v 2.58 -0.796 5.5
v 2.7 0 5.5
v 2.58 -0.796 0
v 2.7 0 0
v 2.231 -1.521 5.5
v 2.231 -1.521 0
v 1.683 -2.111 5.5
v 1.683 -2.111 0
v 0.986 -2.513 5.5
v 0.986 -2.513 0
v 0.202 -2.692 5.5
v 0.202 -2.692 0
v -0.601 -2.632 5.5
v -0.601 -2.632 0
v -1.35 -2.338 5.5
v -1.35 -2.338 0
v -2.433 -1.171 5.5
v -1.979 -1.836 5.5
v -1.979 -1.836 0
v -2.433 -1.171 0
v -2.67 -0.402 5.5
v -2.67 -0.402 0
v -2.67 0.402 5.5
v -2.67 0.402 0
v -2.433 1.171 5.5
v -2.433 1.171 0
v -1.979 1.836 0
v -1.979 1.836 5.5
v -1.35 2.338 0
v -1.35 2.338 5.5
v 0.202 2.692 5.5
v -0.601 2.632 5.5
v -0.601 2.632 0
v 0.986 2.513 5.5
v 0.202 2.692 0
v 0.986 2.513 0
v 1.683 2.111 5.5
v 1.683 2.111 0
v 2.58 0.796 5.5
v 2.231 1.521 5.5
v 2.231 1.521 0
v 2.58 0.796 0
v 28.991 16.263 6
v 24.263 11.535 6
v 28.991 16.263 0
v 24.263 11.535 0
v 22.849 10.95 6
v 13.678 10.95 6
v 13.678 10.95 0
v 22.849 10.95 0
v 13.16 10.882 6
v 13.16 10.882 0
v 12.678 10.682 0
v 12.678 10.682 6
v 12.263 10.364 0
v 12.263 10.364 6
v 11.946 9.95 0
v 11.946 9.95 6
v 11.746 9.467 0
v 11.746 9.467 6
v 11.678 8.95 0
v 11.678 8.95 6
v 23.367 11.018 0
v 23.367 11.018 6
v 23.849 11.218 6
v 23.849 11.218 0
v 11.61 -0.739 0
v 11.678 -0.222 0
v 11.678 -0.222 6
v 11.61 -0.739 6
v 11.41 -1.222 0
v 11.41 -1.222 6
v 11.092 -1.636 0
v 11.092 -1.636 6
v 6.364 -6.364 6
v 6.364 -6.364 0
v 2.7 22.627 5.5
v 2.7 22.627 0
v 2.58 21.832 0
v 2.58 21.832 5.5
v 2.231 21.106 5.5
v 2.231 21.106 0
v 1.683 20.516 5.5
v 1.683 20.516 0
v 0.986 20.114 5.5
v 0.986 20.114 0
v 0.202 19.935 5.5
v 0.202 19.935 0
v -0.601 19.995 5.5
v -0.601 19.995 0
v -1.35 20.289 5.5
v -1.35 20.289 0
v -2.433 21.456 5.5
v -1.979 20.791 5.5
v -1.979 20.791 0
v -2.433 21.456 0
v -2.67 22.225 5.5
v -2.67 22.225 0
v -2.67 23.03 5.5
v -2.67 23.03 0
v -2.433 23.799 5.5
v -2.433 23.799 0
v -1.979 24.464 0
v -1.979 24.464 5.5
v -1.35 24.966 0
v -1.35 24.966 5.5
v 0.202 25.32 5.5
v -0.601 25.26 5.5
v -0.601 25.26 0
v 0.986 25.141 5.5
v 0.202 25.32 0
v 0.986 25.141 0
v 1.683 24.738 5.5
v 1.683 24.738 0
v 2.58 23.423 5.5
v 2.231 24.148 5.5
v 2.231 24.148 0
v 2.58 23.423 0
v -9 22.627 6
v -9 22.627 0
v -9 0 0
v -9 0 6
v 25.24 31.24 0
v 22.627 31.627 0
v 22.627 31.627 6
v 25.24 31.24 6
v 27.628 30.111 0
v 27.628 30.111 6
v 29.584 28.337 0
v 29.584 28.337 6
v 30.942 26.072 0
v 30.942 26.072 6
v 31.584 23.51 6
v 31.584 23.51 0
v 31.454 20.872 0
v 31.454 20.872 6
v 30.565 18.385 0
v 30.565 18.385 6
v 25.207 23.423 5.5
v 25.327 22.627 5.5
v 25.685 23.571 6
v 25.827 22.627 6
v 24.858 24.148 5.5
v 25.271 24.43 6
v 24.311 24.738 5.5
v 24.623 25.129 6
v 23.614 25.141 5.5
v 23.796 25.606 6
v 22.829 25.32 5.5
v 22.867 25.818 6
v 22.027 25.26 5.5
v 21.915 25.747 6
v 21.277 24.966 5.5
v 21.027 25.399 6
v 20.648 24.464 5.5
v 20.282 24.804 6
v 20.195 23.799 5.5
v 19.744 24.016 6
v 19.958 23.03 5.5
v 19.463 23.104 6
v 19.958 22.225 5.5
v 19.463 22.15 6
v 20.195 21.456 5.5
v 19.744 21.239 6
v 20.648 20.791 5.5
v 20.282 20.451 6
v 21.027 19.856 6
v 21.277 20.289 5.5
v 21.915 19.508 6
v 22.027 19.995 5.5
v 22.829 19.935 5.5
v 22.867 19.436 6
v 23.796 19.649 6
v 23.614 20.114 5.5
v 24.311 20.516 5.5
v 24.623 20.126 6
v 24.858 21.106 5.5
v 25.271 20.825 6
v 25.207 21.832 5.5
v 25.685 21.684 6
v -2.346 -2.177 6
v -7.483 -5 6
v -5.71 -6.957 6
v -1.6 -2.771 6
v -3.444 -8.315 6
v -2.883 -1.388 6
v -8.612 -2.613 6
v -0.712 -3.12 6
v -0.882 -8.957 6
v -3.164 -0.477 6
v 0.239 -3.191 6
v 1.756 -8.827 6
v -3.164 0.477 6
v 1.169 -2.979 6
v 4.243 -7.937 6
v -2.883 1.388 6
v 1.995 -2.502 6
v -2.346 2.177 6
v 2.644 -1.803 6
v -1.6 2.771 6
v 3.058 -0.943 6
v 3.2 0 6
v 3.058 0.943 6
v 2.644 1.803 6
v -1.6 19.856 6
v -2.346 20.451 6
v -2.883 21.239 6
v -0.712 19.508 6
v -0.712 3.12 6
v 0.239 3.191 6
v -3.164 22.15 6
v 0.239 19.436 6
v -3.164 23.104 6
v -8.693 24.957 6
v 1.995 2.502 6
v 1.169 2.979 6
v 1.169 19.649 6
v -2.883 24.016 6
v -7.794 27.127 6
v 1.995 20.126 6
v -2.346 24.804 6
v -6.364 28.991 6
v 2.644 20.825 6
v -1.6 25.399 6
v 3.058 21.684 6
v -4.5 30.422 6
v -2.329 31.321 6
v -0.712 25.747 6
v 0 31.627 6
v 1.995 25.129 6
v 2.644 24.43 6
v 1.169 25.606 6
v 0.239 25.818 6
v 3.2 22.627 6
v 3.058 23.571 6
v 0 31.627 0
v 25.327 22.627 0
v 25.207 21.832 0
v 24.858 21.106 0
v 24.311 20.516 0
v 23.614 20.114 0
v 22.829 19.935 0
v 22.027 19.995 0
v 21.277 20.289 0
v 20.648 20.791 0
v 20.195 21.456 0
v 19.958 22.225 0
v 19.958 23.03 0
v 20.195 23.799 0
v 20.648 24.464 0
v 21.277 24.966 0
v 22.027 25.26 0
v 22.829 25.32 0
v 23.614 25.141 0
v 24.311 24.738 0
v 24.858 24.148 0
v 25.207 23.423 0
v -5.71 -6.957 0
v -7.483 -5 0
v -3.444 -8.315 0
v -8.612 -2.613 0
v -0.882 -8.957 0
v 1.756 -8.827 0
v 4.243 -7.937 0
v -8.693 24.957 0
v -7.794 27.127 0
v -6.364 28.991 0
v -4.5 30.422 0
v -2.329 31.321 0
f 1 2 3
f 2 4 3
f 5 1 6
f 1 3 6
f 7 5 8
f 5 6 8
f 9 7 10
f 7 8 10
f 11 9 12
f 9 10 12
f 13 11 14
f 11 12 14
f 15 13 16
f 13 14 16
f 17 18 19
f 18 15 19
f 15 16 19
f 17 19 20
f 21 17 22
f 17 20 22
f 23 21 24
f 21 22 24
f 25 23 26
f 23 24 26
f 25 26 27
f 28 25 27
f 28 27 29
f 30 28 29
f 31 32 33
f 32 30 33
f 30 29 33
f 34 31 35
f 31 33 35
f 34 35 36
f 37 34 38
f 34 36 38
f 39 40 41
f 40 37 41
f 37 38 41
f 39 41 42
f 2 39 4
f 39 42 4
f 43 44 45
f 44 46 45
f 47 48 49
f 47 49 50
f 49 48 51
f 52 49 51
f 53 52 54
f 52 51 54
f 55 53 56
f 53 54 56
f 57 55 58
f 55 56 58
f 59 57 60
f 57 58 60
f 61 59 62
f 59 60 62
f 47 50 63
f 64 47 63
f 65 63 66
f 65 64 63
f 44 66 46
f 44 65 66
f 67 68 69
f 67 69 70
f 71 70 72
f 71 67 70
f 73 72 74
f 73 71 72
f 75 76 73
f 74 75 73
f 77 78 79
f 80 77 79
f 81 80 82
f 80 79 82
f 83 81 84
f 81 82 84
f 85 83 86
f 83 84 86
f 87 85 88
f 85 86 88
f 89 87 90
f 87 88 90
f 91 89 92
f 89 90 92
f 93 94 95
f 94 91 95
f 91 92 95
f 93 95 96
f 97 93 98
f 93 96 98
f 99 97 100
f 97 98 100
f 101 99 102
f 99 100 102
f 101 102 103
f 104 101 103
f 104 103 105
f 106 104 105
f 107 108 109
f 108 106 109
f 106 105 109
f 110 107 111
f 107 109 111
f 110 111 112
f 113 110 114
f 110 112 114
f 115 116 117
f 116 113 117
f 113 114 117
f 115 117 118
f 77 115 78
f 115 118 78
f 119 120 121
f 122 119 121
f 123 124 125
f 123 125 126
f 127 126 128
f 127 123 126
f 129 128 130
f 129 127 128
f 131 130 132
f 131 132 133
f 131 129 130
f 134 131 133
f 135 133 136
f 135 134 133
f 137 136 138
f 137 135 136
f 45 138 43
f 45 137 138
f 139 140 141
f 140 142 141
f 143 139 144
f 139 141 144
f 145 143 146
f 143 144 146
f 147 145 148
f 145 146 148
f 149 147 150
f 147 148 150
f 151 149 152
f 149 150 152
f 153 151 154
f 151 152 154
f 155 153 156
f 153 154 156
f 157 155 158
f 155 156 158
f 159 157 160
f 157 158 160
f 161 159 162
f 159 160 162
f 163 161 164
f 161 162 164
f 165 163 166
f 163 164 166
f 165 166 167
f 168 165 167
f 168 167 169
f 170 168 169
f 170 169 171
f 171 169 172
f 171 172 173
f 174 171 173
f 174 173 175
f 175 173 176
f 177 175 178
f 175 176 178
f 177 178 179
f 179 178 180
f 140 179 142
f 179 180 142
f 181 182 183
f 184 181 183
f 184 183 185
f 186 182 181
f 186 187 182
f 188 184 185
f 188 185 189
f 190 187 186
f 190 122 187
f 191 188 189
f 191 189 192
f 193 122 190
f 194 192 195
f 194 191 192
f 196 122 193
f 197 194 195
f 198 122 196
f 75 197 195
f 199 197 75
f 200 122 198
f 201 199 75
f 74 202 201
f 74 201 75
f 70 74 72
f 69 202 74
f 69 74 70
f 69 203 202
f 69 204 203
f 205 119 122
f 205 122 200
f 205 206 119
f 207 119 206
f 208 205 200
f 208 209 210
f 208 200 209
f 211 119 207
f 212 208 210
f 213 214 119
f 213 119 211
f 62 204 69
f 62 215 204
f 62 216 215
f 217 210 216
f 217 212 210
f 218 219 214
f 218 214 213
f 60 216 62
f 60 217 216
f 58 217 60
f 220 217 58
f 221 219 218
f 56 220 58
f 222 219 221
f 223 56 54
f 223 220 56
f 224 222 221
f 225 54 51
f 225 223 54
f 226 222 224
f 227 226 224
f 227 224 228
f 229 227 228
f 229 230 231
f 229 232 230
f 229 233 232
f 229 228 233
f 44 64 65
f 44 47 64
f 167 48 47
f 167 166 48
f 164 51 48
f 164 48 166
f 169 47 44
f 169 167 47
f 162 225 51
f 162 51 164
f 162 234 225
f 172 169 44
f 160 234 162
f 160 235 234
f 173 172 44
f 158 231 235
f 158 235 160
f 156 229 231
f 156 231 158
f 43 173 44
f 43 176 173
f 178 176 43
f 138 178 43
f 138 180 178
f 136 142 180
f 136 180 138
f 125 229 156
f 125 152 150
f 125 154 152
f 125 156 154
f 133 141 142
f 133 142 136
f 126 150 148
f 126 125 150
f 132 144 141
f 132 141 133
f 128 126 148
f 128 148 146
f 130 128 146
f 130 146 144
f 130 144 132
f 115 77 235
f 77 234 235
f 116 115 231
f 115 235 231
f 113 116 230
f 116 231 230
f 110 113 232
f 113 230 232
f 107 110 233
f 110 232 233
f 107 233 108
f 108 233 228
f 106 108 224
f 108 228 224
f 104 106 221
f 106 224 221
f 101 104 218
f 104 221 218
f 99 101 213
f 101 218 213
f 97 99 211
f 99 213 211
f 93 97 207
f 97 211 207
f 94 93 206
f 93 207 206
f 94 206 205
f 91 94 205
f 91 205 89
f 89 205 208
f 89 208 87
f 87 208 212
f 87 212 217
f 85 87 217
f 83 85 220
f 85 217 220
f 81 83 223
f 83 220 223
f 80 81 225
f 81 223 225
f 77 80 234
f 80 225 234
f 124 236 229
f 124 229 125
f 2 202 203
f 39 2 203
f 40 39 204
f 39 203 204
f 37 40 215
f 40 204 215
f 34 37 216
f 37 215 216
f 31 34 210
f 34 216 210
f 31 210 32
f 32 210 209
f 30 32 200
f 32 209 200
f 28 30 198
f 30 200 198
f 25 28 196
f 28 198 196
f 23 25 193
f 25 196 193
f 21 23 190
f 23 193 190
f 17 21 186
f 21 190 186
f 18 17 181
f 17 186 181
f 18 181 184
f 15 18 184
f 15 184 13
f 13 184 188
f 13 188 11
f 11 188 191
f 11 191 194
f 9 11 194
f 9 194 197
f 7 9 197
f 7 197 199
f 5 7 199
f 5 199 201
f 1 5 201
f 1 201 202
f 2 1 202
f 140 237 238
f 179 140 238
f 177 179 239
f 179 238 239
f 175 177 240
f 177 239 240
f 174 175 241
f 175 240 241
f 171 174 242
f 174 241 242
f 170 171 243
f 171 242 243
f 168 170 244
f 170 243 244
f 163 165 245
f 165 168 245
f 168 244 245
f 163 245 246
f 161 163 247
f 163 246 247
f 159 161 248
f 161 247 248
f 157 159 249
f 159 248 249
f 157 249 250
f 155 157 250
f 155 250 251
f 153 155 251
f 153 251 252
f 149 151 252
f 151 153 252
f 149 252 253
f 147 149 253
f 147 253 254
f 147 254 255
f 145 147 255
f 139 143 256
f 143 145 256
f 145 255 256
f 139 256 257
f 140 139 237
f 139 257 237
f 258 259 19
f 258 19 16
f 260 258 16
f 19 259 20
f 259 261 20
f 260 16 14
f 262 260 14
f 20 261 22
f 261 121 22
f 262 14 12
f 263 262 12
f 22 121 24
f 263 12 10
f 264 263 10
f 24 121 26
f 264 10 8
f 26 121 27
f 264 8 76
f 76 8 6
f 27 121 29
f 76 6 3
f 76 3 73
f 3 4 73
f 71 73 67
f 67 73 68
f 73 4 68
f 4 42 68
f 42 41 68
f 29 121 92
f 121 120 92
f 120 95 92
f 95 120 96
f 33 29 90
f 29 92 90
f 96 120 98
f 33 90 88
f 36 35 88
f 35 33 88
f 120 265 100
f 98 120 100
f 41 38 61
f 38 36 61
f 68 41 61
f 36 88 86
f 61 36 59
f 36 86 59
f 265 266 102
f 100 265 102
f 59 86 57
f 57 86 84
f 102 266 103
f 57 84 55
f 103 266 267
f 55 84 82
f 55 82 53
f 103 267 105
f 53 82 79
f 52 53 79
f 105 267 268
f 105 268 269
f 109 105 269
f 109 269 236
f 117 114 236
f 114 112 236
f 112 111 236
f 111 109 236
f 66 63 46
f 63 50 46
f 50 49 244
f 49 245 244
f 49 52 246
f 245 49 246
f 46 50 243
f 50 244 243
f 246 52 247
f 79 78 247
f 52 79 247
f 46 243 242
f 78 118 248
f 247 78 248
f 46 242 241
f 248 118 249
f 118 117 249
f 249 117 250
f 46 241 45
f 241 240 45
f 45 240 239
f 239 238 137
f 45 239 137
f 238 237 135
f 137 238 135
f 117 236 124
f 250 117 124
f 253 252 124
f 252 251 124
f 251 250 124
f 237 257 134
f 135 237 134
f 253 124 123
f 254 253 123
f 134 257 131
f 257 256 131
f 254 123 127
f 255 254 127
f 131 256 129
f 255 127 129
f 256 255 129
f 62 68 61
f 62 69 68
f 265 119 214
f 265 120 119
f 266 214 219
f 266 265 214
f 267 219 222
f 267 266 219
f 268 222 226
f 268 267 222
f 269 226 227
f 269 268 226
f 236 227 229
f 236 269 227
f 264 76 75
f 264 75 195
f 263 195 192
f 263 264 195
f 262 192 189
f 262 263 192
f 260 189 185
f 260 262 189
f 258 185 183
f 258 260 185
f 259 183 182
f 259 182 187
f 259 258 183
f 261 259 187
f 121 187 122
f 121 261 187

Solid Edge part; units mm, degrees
sketch "Sketch1" plane through (0, 0, 0) normal (0, 0, 1) x (1, 0, 0)
  line L0 (-9, 22.6274) -> (-9, 0)
  line L1 (6.364, -6.364) -> (28.9914, 16.2635)
  line L2 (0, 31.6274) -> (22.6274, 31.6274)
  arc A0 (6.364, -6.364) -> (-9, 0) centre (0, 0) cw
  arc A1 (22.6274, 31.6274) -> (28.9914, 16.2635) centre (22.6274, 22.6274) cw
  arc A2 (-9, 22.6274) -> (0, 31.6274) centre (0, 22.6274) cw
  circle A3 centre (0, 0) radius 2.7
  circle A4 centre (0, 22.6274) radius 2.7
  circle A5 centre (22.6274, 22.6274) radius 2.7
extrude "Protrusion1" add sketch "Sketch1" along normal blind 6
sketch "Sketch2" plane through (11.3137, 11.3137, 6) normal (0, 0, 1) x (1, 0, 0)
  line L0 (2.364, -0.364) -> (24.7236, -0.364)
  arc A0 (0.364, -2.364) -> (2.364, -0.364) centre (2.364, -2.364) cw
  line L1 (0.364, -23.5521) -> (0.364, -2.364)
extrude "Cutout1" cut sketch "Sketch2" against normal through all material side at (24.8575, 10.8997, 6)
fillet "Round_1" radius 2 2 edges at (11.6777, -1.0503, 3) (23.6777, 10.9497, 3)
chamfer "Chamfer_1" distance 0.5 angle 45 3 edges at (-2.7, 0, 6) (-2.7, 22.6274, 6) (19.9274, 22.6274, 6)
properties material "ABS Plastic, medium impact"
